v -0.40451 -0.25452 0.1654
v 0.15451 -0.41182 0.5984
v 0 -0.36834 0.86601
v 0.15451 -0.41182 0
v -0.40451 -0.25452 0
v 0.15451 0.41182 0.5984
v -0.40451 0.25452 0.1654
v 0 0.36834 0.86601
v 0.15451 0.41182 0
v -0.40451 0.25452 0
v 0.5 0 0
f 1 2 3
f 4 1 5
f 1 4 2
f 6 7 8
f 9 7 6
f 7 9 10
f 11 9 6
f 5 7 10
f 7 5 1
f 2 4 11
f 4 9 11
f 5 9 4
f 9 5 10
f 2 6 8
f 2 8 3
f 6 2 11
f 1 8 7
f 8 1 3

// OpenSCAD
// file: equilateral_triangle.scad
module equilateral_triangle() {
	polygon(
		points = [[-0.5, 0], [0.5, 0], [0, sqrt(3) / 2]],
		paths = [[0, 1, 2]]
	);
}
// file: settings.scad
//// Parametrics settings

RingNumberOfTeeth=100;
DriverNumberOfTeeth=6;

ClampThickness=20;


// this is the diameter of the hole inside the clamp
ClampDiameter=55; 


ClampLength=30;
ClampZone=20;

GrooveWidth=5;

fn=100;


RingThickness = 20; 
RingDiameter=140;

Tolerance=0.1;
// file: elliptic_cylinder.scad
include <unit_cylinder.scad>;

module elliptic_cylinder() {
	scale([1, sqrt(3)/2, 1]) {
        unit_cylinder();
    }
}
// file: equilateral_wedge.scad
include <equilateral_triangle.scad>;

module equilateral_wedge() {
	translate([0, 0.5, 0]) {
		rotate([90, 0, 0]) {
			linear_extrude(height = 1) {
				equilateral_triangle();
			}
		}
	}
}
// file: unit_cylinder.scad
include <settings.scad>;

module unit_cylinder() {
	cylinder(
		h = 1,
		r1 = 0.5,
		r2 = 0.5
	);
}
// file: elliptic_plug.scad
include <elliptic_cylinder.scad>;
include <equilateral_wedge.scad>;

module elliptic_plug() {
	intersection() {
		elliptic_cylinder();
		equilateral_wedge();
	}
}
// file: equilateral_plug.scad
include <unit_cylinder.scad>;
include <equilateral_wedge.scad>;

module equilateral_plug() {
	intersection() {
		unit_cylinder();
		equilateral_wedge();
	}
}
// main file
include <equilateral_plug.scad>;
include <elliptic_plug.scad>;

$vpr = [0, 0, 90];
$vpt = [0, 0, 0.5];
$vpd = 3;

%equilateral_plug();
elliptic_plug();
